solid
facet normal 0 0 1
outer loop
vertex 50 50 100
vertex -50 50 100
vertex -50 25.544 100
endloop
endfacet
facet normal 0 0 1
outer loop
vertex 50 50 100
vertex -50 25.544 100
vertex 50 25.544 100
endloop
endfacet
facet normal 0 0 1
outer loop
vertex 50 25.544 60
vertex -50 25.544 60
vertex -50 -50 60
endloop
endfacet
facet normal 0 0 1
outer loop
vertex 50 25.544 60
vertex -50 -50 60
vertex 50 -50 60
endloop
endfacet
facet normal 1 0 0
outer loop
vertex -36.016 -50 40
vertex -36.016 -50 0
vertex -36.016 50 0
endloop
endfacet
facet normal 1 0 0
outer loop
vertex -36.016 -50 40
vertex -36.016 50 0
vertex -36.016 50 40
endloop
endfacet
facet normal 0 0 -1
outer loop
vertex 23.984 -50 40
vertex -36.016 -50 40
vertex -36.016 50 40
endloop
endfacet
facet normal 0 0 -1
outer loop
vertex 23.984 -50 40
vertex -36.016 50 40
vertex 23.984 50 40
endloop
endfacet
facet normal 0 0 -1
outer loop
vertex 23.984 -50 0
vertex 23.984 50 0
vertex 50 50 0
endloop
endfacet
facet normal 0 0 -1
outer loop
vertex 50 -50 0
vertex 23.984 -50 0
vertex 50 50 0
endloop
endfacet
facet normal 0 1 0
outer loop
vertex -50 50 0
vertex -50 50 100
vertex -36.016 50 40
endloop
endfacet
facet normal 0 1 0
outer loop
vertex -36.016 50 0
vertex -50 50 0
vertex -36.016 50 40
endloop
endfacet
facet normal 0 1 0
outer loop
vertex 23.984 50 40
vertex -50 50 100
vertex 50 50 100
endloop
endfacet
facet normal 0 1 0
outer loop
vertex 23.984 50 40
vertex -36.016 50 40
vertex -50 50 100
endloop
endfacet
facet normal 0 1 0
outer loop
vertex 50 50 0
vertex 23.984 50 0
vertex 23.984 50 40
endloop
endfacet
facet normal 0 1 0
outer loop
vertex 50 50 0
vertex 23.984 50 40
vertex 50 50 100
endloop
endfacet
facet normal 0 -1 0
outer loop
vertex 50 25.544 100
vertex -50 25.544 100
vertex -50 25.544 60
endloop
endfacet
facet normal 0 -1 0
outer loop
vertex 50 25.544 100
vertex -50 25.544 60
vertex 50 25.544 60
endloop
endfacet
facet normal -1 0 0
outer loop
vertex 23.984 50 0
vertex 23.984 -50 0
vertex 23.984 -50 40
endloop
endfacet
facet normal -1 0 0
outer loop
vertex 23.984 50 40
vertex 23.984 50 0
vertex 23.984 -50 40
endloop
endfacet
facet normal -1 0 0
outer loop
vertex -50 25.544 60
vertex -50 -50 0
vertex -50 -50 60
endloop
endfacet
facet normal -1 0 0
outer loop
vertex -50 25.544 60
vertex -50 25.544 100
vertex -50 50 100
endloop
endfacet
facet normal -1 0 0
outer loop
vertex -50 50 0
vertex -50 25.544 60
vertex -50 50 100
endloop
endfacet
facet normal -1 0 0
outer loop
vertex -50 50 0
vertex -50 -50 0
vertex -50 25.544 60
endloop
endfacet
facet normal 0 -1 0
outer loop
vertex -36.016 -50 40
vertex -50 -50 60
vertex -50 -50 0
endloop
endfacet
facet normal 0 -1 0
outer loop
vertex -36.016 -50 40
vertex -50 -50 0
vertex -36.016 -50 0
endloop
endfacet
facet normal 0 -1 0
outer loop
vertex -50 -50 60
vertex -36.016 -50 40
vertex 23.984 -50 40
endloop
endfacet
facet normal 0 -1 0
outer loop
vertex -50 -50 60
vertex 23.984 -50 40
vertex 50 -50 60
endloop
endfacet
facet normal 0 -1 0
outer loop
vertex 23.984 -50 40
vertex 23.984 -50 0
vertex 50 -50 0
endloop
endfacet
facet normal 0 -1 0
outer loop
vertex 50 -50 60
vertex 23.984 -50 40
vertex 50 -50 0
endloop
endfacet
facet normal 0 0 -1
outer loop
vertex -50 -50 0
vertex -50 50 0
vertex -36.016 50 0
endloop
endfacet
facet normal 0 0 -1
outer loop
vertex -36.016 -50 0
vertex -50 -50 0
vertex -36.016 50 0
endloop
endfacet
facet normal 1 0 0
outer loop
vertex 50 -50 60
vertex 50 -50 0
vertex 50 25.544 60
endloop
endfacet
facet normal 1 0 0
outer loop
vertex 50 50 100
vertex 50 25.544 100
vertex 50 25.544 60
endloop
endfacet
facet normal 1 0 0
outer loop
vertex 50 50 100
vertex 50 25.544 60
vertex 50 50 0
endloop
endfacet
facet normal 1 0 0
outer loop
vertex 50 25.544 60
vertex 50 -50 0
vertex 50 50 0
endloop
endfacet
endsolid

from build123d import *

# Parameters (mm, degrees)
F0_W     = 100
F0_H     = 100
F1_DEPTH = 100
F2_W     = 100
F2_H     = 75.544288
F3_DEPTH = 40
F4_W     = 60
F4_H     = 40
F5_DEPTH = 100.001
F6_DEPTH = 100.001


with BuildPart() as f1:
    # F0 (on Top) → F1 (new body)
    with BuildSketch(Plane.XY):
        Rectangle(F0_W, F0_H)
    extrude(amount=F1_DEPTH)

    # F2 (on face) → F3 (cut)
    with BuildSketch(Plane.XY.offset(100)):
        with Locations((0, -12.227856)):
            Rectangle(F2_W, F2_H)
    extrude(amount=-F3_DEPTH, mode=Mode.SUBTRACT)

    # F4 (on face) → F5 (cut, through all)
    with BuildSketch(Plane.XZ.offset(50)):
        with Locations((-6.015749, 20)):
            Rectangle(F4_W, F4_H)
    extrude(amount=-F5_DEPTH, mode=Mode.SUBTRACT)

    # F4 (on face) → F6 (cut, through all)
    with BuildSketch(Plane.XZ.offset(50)):
        with Locations((-6.015749, 20)):
            Rectangle(F4_W, F4_H)
    extrude(amount=-F6_DEPTH, mode=Mode.SUBTRACT)


solid = f1.part
